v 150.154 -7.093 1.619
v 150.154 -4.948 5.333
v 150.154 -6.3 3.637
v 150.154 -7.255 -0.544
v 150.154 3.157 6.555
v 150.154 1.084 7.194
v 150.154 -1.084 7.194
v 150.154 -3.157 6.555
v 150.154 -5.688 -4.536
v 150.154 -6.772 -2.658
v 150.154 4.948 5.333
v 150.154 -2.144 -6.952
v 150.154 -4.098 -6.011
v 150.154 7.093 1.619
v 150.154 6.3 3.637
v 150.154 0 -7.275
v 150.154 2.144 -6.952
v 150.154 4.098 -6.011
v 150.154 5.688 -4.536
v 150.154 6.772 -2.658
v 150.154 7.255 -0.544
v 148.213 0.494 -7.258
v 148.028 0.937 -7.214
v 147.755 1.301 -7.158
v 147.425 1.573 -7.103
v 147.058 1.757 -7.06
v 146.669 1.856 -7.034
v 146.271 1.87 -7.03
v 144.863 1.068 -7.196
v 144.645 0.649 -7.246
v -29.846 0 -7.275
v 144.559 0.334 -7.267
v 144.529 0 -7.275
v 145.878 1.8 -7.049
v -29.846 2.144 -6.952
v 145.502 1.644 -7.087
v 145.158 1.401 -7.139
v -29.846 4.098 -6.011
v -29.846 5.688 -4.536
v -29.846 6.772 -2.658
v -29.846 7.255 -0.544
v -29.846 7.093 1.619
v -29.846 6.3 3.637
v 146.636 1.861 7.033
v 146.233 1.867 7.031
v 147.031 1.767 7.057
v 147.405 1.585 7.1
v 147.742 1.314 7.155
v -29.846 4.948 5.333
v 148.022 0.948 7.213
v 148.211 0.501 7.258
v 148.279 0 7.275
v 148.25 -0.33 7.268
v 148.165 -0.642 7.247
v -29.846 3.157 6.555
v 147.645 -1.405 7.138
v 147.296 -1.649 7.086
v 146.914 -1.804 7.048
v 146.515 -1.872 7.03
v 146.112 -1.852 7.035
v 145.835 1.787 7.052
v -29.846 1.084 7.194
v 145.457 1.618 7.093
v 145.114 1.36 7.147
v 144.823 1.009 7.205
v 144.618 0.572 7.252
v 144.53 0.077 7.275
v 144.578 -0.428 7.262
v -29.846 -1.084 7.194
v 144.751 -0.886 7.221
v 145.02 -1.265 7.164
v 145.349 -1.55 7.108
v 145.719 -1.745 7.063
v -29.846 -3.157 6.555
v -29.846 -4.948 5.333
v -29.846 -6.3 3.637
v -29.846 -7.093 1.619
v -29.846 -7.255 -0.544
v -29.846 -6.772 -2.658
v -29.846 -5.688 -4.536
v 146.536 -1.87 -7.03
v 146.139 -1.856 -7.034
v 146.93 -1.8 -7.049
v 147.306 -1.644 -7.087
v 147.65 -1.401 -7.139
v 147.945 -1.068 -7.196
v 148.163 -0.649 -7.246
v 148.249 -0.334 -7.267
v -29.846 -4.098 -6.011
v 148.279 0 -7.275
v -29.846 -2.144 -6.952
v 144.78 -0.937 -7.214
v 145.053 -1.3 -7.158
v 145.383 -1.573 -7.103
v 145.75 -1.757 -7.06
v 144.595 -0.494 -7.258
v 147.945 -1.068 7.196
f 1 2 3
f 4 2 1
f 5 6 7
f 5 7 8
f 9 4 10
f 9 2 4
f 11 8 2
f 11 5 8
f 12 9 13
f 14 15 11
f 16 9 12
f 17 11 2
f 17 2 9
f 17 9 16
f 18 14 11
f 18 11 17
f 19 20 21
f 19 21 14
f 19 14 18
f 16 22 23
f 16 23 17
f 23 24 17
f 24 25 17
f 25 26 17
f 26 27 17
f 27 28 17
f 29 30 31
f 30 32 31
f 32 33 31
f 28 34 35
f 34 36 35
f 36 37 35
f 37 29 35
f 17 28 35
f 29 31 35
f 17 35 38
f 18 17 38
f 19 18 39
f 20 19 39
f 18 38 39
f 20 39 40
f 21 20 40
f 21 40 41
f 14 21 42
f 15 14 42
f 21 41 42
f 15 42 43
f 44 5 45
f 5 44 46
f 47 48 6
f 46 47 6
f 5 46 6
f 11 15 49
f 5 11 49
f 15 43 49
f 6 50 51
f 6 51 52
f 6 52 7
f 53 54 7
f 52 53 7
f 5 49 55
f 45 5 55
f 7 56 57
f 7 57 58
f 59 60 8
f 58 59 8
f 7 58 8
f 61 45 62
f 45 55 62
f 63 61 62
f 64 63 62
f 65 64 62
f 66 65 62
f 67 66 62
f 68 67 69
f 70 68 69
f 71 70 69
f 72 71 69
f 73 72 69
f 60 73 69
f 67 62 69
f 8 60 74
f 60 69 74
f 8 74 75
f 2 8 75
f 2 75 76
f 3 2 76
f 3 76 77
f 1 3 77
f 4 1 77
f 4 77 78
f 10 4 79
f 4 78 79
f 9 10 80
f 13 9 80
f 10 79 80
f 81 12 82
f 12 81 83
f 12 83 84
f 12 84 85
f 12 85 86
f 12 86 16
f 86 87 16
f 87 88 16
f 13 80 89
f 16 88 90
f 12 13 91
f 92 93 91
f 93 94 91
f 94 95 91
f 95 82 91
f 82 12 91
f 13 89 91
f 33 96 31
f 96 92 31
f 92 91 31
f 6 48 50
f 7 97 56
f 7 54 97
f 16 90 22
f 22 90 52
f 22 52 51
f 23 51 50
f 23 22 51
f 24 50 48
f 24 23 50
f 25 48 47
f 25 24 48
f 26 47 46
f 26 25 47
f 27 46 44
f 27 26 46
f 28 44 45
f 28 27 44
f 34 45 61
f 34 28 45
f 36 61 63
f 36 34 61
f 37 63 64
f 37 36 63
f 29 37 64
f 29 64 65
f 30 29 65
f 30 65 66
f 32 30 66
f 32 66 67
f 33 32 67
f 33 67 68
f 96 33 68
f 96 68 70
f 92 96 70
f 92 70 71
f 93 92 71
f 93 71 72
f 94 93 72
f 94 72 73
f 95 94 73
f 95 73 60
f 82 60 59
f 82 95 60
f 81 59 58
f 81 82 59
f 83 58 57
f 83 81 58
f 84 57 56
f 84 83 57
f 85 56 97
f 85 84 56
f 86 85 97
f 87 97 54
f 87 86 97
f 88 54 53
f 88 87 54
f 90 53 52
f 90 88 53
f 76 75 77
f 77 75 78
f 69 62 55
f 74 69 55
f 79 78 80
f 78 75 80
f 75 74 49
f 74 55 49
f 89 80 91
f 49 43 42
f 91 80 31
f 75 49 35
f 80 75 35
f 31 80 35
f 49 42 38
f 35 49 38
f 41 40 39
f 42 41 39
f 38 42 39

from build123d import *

# Parameters (mm, degrees)
SKETCH1_R               = 4.85
BOSS_EXTRUDE1_DEPTH     = 120
CUT_EXTRUDE1_DEPTH      = 121.195860994
CUT_EXTRUDE1_DEPTH_BACK = 121.195860994
SKETCH2_R               = 1.25
SCALE1_SCALE            = 1.5


with BuildPart() as part:
    # Sketch1 → Boss-Extrude1 (new body)
    with BuildSketch(Plane(origin=(0, 0, 0), x_dir=(0, 0, -1), z_dir=(1, 0, 0))):
        Circle(SKETCH1_R)
    extrude(amount=BOSS_EXTRUDE1_DEPTH)

    # Sketch2 → Cut-Extrude1 (cut, two sides: drawn at the far end of the back side and taken through both)
    with BuildSketch(Plane.XY.offset(-CUT_EXTRUDE1_DEPTH_BACK)):
        with Locations((117.5, 0)):
            Circle(SKETCH2_R)
    extrude(amount=CUT_EXTRUDE1_DEPTH + CUT_EXTRUDE1_DEPTH_BACK, mode=Mode.SUBTRACT)


with BuildPart() as part_1:
    # Scale1: scaled about (59.692221028, 5e-09, 2.22e-07)
    add(part.part.scale(SCALE1_SCALE).moved(Location((-29.846110514, -3e-09, -1.11e-07))))


solid = part_1.part
